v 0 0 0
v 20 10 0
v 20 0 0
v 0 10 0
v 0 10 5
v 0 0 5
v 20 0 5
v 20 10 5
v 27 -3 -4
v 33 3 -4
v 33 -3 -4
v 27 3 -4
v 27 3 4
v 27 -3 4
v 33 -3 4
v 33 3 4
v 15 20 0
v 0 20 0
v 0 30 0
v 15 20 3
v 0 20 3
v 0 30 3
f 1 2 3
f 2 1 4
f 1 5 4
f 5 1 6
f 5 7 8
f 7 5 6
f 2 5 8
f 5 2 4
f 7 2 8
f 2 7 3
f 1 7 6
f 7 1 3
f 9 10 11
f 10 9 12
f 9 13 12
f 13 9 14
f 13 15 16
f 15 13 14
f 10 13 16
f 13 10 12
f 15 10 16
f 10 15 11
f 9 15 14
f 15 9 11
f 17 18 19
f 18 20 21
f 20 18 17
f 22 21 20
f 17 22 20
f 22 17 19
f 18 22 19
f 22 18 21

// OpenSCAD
// Zweck: linear_extrude mit height als Name und Position, center = true.
linear_extrude(height = 5) square([20, 10]);
translate([30, 0, 0]) linear_extrude(8, center = true) square(6, center = true);
translate([0, 20, 0]) linear_extrude(height = 3) polygon([[0, 0], [15, 0], [0, 10]]);
